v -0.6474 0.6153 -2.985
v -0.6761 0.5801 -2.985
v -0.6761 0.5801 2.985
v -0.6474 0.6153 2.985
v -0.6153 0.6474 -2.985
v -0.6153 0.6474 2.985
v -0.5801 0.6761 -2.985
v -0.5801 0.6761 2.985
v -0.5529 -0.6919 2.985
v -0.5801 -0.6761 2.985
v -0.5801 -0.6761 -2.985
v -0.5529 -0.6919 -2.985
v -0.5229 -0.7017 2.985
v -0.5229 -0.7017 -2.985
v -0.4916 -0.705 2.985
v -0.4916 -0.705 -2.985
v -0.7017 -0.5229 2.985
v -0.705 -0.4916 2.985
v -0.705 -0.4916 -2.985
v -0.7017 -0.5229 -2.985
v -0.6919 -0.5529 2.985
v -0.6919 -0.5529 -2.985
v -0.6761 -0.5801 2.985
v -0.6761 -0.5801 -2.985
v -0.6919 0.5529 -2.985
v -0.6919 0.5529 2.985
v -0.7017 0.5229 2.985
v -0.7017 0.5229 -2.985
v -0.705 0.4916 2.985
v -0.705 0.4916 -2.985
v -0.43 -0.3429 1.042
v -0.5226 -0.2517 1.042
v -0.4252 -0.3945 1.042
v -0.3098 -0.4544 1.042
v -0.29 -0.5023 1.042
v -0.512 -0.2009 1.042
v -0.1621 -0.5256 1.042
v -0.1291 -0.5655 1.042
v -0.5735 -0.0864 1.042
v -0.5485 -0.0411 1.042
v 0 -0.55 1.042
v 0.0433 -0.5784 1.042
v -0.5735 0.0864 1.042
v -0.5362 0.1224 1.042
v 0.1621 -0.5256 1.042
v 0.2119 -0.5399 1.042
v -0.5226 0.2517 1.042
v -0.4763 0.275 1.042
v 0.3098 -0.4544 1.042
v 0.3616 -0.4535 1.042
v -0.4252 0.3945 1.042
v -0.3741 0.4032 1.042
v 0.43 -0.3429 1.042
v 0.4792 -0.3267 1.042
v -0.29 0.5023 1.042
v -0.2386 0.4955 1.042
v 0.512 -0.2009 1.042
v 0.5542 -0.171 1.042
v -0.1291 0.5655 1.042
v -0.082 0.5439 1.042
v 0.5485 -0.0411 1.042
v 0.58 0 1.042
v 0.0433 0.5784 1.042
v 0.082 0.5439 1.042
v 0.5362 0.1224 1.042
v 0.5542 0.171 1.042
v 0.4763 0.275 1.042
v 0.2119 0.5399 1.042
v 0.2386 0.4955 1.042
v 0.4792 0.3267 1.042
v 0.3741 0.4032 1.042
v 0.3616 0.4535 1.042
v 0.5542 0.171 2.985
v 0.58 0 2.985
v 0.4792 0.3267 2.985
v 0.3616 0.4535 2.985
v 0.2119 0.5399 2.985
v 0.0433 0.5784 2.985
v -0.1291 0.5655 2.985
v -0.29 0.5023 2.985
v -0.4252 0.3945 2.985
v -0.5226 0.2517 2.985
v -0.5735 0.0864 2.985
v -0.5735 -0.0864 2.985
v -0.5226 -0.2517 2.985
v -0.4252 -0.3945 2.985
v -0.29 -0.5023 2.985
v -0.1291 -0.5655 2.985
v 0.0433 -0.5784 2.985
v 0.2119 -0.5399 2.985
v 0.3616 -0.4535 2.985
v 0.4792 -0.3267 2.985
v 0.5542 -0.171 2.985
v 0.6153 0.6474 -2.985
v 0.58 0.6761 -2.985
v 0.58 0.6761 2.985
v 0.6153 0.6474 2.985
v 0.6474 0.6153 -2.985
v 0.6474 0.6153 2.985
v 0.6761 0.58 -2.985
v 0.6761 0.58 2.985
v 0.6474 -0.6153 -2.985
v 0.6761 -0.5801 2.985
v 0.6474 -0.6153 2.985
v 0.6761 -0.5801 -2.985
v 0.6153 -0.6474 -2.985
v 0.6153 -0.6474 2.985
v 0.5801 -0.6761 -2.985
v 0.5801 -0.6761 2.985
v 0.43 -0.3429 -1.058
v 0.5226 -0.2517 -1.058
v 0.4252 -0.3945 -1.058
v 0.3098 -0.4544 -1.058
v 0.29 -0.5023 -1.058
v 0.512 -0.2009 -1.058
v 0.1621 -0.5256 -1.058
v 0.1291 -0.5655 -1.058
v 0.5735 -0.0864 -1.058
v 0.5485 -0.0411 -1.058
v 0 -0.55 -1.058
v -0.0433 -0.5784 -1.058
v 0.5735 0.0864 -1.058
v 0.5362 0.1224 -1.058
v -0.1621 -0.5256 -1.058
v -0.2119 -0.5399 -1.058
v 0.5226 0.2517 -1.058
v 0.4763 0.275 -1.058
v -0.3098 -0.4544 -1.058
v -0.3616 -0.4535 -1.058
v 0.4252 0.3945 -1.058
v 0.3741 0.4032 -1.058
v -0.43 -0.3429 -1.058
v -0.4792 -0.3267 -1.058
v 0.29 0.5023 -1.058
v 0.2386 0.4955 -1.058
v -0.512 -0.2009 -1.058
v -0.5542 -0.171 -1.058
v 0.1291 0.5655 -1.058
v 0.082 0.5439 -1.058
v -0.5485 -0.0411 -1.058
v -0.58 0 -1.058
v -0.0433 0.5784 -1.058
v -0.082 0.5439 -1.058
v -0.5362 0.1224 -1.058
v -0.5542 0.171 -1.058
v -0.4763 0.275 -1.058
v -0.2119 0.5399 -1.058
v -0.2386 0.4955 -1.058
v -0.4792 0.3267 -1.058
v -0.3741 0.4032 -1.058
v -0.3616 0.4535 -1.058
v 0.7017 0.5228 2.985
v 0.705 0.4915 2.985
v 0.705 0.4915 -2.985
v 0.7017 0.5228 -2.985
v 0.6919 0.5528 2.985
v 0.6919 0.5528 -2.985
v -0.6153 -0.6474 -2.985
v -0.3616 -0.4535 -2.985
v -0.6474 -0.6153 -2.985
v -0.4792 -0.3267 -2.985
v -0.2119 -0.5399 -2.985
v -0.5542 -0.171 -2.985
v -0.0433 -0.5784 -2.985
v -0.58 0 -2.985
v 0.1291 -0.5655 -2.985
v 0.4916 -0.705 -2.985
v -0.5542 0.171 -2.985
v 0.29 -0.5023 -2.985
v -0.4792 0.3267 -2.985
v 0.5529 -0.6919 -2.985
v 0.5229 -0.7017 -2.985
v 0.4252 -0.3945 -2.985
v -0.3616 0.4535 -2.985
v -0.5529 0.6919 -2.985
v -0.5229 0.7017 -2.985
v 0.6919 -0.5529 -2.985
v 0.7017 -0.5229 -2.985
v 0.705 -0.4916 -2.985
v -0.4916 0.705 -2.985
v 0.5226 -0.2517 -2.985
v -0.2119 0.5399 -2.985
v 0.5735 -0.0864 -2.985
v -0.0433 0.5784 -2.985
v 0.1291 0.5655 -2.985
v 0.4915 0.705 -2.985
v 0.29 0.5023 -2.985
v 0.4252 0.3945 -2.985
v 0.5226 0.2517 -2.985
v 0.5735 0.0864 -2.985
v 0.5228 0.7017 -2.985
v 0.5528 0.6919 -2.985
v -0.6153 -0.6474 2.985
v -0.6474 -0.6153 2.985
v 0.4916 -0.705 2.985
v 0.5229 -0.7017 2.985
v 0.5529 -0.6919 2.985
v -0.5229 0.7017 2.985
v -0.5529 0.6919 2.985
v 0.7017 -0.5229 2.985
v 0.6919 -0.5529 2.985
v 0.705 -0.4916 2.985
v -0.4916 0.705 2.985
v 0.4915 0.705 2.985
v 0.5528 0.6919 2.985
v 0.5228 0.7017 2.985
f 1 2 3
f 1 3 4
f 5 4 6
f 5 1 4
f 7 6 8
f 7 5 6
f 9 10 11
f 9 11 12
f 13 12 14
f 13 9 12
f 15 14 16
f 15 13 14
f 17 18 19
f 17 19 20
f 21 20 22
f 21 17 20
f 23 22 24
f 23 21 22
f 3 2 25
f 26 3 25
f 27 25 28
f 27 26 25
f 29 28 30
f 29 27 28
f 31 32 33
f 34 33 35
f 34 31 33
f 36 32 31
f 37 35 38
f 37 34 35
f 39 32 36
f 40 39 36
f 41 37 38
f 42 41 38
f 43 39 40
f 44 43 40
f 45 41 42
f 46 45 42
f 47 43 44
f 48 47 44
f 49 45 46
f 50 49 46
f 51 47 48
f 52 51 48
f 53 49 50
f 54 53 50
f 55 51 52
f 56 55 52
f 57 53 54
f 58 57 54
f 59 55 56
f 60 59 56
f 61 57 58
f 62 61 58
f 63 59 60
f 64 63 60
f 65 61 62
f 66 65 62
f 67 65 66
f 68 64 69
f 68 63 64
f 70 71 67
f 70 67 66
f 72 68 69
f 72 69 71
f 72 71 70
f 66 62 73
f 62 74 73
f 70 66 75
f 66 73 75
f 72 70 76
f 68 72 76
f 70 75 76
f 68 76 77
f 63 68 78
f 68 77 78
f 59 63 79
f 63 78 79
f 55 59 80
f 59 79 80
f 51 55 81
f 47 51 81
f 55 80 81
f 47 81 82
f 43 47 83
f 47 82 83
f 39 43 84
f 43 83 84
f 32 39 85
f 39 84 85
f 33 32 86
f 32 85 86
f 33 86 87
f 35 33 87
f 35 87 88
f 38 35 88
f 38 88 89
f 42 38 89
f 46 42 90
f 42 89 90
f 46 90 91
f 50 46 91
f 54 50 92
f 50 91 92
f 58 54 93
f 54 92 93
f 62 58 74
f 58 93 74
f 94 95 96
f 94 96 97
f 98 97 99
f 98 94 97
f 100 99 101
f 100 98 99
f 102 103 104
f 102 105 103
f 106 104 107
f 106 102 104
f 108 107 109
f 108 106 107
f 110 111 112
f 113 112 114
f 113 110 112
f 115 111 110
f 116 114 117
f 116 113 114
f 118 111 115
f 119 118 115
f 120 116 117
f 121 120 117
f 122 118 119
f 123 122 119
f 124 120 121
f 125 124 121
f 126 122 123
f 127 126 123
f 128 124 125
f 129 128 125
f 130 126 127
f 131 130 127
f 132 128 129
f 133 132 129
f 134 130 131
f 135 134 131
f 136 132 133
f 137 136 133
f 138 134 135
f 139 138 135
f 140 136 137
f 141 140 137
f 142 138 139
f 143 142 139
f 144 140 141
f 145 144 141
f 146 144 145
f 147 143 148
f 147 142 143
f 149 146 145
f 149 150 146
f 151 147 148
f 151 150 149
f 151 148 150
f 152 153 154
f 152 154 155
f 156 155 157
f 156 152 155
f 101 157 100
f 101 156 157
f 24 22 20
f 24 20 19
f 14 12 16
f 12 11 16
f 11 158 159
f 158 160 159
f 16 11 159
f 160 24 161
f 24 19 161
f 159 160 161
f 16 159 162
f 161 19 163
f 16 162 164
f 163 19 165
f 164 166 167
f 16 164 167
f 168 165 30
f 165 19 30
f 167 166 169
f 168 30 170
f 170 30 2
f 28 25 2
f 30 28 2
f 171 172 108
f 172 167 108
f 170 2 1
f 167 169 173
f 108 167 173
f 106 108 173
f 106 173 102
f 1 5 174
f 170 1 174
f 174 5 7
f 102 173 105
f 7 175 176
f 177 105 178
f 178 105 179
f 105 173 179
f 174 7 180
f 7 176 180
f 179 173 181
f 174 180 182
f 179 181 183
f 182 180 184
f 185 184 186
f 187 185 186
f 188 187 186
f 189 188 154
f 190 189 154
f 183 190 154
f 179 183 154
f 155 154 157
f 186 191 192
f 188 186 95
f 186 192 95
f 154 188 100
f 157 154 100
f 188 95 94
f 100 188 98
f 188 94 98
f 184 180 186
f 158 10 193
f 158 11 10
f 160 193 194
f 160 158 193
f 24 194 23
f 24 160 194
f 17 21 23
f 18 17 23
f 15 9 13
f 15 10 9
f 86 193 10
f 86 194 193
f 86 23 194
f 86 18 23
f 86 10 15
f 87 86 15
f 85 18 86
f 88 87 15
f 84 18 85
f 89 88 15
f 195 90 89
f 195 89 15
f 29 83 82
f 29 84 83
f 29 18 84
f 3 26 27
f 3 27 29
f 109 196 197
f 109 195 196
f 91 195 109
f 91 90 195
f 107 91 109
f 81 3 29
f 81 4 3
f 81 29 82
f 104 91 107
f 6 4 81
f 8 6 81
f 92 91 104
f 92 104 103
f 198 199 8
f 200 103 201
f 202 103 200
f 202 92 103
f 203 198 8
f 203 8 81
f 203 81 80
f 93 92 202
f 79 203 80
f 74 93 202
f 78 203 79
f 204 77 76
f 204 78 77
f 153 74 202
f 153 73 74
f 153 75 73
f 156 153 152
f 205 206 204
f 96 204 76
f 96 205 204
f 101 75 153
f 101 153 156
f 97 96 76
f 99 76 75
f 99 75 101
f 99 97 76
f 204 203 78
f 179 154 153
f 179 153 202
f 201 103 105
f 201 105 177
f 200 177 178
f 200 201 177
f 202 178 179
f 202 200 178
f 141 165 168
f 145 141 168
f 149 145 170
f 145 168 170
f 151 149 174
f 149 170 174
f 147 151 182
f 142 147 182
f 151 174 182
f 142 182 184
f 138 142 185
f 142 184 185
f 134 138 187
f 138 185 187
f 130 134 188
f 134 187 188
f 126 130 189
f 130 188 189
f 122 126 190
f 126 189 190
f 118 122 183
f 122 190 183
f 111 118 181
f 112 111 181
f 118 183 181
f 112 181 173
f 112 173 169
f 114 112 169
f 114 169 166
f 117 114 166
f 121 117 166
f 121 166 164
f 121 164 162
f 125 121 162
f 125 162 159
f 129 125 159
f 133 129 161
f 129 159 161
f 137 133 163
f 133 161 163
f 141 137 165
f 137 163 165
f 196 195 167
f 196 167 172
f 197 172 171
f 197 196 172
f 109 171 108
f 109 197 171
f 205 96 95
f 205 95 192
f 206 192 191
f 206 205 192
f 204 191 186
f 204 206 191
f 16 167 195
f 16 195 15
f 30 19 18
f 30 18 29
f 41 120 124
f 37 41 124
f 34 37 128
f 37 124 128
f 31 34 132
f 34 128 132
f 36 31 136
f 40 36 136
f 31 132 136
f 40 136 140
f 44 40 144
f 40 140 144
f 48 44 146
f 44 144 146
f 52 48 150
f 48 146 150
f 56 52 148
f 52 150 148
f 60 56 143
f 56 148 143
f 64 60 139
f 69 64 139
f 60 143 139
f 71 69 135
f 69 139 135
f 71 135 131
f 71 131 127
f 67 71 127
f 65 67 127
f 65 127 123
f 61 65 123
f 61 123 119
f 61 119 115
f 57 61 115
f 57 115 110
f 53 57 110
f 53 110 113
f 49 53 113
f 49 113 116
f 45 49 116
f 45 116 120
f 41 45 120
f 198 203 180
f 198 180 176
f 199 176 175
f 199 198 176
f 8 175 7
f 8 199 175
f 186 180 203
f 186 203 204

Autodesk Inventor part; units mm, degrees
ref_plane "YZ Plane" through (0, 0, 0) normal (1, 0, 0) x (0, 1, 0)
ref_plane "XZ Plane" through (0, 0, 0) normal (0, 1, 0) x (-1, 0, 0)
ref_plane "XY Plane" through (0, 0, 0) normal (0, 0, 1) x (1, 0, 0)
sketch "Sketch1" plane through (0, 0, 0) normal (0, 0, 1) x (1, 0, 0)
  line L0 (-0.705, 0.705) -> (0.705, 0.705)
  line L1 (0.705, 0.705) -> (0.705, -0.705)
  line L2 (0.705, -0.705) -> (-0.705, -0.705)
  line L3 (-0.705, -0.705) -> (-0.705, 0.705)
  point P0 (0, 0)
  point P1 (-0.705, 0)
  point P2 (0, 0.705)
  dimension "d0" = 1.41
extrude "Extrusion1" add sketch "Sketch1" along normal mid plane 5.97
fillet "Fillet1" [suppressed]
sketch "Sketch2" plane through (0, 0, 2.985) normal (0, 0, 1) x (1, 0, 0)
  circle A0 centre (0, 0) radius 0.58
  dimension "d4" = 1.16
extrude "Extrusion2" cut sketch "Sketch2" against normal blind 1.943
hole "Hole1" at (0, 0, 1.042) direction (0, 0, -1) diameter 1.1 depth 2.1
thread "Thread1" size "M1.1x0.25" class "6H" standard "ISO Metric profile" full length
sketch "Sketch3" plane through (0, 0, -2.985) normal (0, 0, -1) x (-1, 0, 0)
  circle A0 centre (0, 0) radius 0.58
  dimension "d18" = 1.16
extrude "Extrusion3" cut sketch "Sketch3" against normal up to surface (1.927 mm away)
sketch "Sketch4" plane through (0, 0, -2.985) normal (0, 0, -1) x (-1, 0, 0)
  line L0 (-0.705, 0.705) -> (0.705, 0.705) projected
  line L1 (-0.705, -0.705) -> (-0.705, 0.705) projected
  line L2 (0.705, -0.705) -> (-0.705, -0.705) projected
  line L3 (0.705, 0.705) -> (0.705, -0.705) projected
  arc A0 (-0.535, 0.705) -> (-0.705, 0.535) centre (-0.3189, 0.3189) ccw
  circle A1 centre (0.3189, 0.3189) radius 0.4425
  circle A2 centre (-0.3189, -0.3189) radius 0.4425
  circle A3 centre (0.3189, -0.3189) radius 0.4425
  point P0 (0.535, 0.705)
  point P1 (0.705, 0.535)
  point P2 (0.705, -0.535)
  point P3 (0.535, -0.705)
  point P4 (-0.535, -0.705)
  point P5 (-0.705, -0.535)
  dimension "d22" = 0.17
  dimension "d23" = 0.17
  dimension "d25" = 0.885
  dimension "d26" = 0.885
  dimension "d27" = 0.885
  dimension "d28" = 0.17
  dimension "d29" = 0.17
  dimension "d30" = 0.17
  dimension "d31" = 0.17
  dimension "d32" = 0.17
  dimension "d33" = 0.17
extrude "Extrusion4" cut sketch "Sketch4" against normal through all contours L0 A0 L1 | L0 L3 A1 | A2 L2 L1 | L3 L2 A3
fillet "Fillet2" radius 0.15 8 edges at (0.705, 0.535, 0) (0.535, 0.705, 0) (-0.535, 0.705, 0) (-0.705, 0.535, 0) (-0.705, -0.535, 0) (-0.535, -0.705, 0) (0.535, -0.705, 0) (0.705, -0.535, 0)
properties part number "PZT_Guide" material "Stainless Steel"
